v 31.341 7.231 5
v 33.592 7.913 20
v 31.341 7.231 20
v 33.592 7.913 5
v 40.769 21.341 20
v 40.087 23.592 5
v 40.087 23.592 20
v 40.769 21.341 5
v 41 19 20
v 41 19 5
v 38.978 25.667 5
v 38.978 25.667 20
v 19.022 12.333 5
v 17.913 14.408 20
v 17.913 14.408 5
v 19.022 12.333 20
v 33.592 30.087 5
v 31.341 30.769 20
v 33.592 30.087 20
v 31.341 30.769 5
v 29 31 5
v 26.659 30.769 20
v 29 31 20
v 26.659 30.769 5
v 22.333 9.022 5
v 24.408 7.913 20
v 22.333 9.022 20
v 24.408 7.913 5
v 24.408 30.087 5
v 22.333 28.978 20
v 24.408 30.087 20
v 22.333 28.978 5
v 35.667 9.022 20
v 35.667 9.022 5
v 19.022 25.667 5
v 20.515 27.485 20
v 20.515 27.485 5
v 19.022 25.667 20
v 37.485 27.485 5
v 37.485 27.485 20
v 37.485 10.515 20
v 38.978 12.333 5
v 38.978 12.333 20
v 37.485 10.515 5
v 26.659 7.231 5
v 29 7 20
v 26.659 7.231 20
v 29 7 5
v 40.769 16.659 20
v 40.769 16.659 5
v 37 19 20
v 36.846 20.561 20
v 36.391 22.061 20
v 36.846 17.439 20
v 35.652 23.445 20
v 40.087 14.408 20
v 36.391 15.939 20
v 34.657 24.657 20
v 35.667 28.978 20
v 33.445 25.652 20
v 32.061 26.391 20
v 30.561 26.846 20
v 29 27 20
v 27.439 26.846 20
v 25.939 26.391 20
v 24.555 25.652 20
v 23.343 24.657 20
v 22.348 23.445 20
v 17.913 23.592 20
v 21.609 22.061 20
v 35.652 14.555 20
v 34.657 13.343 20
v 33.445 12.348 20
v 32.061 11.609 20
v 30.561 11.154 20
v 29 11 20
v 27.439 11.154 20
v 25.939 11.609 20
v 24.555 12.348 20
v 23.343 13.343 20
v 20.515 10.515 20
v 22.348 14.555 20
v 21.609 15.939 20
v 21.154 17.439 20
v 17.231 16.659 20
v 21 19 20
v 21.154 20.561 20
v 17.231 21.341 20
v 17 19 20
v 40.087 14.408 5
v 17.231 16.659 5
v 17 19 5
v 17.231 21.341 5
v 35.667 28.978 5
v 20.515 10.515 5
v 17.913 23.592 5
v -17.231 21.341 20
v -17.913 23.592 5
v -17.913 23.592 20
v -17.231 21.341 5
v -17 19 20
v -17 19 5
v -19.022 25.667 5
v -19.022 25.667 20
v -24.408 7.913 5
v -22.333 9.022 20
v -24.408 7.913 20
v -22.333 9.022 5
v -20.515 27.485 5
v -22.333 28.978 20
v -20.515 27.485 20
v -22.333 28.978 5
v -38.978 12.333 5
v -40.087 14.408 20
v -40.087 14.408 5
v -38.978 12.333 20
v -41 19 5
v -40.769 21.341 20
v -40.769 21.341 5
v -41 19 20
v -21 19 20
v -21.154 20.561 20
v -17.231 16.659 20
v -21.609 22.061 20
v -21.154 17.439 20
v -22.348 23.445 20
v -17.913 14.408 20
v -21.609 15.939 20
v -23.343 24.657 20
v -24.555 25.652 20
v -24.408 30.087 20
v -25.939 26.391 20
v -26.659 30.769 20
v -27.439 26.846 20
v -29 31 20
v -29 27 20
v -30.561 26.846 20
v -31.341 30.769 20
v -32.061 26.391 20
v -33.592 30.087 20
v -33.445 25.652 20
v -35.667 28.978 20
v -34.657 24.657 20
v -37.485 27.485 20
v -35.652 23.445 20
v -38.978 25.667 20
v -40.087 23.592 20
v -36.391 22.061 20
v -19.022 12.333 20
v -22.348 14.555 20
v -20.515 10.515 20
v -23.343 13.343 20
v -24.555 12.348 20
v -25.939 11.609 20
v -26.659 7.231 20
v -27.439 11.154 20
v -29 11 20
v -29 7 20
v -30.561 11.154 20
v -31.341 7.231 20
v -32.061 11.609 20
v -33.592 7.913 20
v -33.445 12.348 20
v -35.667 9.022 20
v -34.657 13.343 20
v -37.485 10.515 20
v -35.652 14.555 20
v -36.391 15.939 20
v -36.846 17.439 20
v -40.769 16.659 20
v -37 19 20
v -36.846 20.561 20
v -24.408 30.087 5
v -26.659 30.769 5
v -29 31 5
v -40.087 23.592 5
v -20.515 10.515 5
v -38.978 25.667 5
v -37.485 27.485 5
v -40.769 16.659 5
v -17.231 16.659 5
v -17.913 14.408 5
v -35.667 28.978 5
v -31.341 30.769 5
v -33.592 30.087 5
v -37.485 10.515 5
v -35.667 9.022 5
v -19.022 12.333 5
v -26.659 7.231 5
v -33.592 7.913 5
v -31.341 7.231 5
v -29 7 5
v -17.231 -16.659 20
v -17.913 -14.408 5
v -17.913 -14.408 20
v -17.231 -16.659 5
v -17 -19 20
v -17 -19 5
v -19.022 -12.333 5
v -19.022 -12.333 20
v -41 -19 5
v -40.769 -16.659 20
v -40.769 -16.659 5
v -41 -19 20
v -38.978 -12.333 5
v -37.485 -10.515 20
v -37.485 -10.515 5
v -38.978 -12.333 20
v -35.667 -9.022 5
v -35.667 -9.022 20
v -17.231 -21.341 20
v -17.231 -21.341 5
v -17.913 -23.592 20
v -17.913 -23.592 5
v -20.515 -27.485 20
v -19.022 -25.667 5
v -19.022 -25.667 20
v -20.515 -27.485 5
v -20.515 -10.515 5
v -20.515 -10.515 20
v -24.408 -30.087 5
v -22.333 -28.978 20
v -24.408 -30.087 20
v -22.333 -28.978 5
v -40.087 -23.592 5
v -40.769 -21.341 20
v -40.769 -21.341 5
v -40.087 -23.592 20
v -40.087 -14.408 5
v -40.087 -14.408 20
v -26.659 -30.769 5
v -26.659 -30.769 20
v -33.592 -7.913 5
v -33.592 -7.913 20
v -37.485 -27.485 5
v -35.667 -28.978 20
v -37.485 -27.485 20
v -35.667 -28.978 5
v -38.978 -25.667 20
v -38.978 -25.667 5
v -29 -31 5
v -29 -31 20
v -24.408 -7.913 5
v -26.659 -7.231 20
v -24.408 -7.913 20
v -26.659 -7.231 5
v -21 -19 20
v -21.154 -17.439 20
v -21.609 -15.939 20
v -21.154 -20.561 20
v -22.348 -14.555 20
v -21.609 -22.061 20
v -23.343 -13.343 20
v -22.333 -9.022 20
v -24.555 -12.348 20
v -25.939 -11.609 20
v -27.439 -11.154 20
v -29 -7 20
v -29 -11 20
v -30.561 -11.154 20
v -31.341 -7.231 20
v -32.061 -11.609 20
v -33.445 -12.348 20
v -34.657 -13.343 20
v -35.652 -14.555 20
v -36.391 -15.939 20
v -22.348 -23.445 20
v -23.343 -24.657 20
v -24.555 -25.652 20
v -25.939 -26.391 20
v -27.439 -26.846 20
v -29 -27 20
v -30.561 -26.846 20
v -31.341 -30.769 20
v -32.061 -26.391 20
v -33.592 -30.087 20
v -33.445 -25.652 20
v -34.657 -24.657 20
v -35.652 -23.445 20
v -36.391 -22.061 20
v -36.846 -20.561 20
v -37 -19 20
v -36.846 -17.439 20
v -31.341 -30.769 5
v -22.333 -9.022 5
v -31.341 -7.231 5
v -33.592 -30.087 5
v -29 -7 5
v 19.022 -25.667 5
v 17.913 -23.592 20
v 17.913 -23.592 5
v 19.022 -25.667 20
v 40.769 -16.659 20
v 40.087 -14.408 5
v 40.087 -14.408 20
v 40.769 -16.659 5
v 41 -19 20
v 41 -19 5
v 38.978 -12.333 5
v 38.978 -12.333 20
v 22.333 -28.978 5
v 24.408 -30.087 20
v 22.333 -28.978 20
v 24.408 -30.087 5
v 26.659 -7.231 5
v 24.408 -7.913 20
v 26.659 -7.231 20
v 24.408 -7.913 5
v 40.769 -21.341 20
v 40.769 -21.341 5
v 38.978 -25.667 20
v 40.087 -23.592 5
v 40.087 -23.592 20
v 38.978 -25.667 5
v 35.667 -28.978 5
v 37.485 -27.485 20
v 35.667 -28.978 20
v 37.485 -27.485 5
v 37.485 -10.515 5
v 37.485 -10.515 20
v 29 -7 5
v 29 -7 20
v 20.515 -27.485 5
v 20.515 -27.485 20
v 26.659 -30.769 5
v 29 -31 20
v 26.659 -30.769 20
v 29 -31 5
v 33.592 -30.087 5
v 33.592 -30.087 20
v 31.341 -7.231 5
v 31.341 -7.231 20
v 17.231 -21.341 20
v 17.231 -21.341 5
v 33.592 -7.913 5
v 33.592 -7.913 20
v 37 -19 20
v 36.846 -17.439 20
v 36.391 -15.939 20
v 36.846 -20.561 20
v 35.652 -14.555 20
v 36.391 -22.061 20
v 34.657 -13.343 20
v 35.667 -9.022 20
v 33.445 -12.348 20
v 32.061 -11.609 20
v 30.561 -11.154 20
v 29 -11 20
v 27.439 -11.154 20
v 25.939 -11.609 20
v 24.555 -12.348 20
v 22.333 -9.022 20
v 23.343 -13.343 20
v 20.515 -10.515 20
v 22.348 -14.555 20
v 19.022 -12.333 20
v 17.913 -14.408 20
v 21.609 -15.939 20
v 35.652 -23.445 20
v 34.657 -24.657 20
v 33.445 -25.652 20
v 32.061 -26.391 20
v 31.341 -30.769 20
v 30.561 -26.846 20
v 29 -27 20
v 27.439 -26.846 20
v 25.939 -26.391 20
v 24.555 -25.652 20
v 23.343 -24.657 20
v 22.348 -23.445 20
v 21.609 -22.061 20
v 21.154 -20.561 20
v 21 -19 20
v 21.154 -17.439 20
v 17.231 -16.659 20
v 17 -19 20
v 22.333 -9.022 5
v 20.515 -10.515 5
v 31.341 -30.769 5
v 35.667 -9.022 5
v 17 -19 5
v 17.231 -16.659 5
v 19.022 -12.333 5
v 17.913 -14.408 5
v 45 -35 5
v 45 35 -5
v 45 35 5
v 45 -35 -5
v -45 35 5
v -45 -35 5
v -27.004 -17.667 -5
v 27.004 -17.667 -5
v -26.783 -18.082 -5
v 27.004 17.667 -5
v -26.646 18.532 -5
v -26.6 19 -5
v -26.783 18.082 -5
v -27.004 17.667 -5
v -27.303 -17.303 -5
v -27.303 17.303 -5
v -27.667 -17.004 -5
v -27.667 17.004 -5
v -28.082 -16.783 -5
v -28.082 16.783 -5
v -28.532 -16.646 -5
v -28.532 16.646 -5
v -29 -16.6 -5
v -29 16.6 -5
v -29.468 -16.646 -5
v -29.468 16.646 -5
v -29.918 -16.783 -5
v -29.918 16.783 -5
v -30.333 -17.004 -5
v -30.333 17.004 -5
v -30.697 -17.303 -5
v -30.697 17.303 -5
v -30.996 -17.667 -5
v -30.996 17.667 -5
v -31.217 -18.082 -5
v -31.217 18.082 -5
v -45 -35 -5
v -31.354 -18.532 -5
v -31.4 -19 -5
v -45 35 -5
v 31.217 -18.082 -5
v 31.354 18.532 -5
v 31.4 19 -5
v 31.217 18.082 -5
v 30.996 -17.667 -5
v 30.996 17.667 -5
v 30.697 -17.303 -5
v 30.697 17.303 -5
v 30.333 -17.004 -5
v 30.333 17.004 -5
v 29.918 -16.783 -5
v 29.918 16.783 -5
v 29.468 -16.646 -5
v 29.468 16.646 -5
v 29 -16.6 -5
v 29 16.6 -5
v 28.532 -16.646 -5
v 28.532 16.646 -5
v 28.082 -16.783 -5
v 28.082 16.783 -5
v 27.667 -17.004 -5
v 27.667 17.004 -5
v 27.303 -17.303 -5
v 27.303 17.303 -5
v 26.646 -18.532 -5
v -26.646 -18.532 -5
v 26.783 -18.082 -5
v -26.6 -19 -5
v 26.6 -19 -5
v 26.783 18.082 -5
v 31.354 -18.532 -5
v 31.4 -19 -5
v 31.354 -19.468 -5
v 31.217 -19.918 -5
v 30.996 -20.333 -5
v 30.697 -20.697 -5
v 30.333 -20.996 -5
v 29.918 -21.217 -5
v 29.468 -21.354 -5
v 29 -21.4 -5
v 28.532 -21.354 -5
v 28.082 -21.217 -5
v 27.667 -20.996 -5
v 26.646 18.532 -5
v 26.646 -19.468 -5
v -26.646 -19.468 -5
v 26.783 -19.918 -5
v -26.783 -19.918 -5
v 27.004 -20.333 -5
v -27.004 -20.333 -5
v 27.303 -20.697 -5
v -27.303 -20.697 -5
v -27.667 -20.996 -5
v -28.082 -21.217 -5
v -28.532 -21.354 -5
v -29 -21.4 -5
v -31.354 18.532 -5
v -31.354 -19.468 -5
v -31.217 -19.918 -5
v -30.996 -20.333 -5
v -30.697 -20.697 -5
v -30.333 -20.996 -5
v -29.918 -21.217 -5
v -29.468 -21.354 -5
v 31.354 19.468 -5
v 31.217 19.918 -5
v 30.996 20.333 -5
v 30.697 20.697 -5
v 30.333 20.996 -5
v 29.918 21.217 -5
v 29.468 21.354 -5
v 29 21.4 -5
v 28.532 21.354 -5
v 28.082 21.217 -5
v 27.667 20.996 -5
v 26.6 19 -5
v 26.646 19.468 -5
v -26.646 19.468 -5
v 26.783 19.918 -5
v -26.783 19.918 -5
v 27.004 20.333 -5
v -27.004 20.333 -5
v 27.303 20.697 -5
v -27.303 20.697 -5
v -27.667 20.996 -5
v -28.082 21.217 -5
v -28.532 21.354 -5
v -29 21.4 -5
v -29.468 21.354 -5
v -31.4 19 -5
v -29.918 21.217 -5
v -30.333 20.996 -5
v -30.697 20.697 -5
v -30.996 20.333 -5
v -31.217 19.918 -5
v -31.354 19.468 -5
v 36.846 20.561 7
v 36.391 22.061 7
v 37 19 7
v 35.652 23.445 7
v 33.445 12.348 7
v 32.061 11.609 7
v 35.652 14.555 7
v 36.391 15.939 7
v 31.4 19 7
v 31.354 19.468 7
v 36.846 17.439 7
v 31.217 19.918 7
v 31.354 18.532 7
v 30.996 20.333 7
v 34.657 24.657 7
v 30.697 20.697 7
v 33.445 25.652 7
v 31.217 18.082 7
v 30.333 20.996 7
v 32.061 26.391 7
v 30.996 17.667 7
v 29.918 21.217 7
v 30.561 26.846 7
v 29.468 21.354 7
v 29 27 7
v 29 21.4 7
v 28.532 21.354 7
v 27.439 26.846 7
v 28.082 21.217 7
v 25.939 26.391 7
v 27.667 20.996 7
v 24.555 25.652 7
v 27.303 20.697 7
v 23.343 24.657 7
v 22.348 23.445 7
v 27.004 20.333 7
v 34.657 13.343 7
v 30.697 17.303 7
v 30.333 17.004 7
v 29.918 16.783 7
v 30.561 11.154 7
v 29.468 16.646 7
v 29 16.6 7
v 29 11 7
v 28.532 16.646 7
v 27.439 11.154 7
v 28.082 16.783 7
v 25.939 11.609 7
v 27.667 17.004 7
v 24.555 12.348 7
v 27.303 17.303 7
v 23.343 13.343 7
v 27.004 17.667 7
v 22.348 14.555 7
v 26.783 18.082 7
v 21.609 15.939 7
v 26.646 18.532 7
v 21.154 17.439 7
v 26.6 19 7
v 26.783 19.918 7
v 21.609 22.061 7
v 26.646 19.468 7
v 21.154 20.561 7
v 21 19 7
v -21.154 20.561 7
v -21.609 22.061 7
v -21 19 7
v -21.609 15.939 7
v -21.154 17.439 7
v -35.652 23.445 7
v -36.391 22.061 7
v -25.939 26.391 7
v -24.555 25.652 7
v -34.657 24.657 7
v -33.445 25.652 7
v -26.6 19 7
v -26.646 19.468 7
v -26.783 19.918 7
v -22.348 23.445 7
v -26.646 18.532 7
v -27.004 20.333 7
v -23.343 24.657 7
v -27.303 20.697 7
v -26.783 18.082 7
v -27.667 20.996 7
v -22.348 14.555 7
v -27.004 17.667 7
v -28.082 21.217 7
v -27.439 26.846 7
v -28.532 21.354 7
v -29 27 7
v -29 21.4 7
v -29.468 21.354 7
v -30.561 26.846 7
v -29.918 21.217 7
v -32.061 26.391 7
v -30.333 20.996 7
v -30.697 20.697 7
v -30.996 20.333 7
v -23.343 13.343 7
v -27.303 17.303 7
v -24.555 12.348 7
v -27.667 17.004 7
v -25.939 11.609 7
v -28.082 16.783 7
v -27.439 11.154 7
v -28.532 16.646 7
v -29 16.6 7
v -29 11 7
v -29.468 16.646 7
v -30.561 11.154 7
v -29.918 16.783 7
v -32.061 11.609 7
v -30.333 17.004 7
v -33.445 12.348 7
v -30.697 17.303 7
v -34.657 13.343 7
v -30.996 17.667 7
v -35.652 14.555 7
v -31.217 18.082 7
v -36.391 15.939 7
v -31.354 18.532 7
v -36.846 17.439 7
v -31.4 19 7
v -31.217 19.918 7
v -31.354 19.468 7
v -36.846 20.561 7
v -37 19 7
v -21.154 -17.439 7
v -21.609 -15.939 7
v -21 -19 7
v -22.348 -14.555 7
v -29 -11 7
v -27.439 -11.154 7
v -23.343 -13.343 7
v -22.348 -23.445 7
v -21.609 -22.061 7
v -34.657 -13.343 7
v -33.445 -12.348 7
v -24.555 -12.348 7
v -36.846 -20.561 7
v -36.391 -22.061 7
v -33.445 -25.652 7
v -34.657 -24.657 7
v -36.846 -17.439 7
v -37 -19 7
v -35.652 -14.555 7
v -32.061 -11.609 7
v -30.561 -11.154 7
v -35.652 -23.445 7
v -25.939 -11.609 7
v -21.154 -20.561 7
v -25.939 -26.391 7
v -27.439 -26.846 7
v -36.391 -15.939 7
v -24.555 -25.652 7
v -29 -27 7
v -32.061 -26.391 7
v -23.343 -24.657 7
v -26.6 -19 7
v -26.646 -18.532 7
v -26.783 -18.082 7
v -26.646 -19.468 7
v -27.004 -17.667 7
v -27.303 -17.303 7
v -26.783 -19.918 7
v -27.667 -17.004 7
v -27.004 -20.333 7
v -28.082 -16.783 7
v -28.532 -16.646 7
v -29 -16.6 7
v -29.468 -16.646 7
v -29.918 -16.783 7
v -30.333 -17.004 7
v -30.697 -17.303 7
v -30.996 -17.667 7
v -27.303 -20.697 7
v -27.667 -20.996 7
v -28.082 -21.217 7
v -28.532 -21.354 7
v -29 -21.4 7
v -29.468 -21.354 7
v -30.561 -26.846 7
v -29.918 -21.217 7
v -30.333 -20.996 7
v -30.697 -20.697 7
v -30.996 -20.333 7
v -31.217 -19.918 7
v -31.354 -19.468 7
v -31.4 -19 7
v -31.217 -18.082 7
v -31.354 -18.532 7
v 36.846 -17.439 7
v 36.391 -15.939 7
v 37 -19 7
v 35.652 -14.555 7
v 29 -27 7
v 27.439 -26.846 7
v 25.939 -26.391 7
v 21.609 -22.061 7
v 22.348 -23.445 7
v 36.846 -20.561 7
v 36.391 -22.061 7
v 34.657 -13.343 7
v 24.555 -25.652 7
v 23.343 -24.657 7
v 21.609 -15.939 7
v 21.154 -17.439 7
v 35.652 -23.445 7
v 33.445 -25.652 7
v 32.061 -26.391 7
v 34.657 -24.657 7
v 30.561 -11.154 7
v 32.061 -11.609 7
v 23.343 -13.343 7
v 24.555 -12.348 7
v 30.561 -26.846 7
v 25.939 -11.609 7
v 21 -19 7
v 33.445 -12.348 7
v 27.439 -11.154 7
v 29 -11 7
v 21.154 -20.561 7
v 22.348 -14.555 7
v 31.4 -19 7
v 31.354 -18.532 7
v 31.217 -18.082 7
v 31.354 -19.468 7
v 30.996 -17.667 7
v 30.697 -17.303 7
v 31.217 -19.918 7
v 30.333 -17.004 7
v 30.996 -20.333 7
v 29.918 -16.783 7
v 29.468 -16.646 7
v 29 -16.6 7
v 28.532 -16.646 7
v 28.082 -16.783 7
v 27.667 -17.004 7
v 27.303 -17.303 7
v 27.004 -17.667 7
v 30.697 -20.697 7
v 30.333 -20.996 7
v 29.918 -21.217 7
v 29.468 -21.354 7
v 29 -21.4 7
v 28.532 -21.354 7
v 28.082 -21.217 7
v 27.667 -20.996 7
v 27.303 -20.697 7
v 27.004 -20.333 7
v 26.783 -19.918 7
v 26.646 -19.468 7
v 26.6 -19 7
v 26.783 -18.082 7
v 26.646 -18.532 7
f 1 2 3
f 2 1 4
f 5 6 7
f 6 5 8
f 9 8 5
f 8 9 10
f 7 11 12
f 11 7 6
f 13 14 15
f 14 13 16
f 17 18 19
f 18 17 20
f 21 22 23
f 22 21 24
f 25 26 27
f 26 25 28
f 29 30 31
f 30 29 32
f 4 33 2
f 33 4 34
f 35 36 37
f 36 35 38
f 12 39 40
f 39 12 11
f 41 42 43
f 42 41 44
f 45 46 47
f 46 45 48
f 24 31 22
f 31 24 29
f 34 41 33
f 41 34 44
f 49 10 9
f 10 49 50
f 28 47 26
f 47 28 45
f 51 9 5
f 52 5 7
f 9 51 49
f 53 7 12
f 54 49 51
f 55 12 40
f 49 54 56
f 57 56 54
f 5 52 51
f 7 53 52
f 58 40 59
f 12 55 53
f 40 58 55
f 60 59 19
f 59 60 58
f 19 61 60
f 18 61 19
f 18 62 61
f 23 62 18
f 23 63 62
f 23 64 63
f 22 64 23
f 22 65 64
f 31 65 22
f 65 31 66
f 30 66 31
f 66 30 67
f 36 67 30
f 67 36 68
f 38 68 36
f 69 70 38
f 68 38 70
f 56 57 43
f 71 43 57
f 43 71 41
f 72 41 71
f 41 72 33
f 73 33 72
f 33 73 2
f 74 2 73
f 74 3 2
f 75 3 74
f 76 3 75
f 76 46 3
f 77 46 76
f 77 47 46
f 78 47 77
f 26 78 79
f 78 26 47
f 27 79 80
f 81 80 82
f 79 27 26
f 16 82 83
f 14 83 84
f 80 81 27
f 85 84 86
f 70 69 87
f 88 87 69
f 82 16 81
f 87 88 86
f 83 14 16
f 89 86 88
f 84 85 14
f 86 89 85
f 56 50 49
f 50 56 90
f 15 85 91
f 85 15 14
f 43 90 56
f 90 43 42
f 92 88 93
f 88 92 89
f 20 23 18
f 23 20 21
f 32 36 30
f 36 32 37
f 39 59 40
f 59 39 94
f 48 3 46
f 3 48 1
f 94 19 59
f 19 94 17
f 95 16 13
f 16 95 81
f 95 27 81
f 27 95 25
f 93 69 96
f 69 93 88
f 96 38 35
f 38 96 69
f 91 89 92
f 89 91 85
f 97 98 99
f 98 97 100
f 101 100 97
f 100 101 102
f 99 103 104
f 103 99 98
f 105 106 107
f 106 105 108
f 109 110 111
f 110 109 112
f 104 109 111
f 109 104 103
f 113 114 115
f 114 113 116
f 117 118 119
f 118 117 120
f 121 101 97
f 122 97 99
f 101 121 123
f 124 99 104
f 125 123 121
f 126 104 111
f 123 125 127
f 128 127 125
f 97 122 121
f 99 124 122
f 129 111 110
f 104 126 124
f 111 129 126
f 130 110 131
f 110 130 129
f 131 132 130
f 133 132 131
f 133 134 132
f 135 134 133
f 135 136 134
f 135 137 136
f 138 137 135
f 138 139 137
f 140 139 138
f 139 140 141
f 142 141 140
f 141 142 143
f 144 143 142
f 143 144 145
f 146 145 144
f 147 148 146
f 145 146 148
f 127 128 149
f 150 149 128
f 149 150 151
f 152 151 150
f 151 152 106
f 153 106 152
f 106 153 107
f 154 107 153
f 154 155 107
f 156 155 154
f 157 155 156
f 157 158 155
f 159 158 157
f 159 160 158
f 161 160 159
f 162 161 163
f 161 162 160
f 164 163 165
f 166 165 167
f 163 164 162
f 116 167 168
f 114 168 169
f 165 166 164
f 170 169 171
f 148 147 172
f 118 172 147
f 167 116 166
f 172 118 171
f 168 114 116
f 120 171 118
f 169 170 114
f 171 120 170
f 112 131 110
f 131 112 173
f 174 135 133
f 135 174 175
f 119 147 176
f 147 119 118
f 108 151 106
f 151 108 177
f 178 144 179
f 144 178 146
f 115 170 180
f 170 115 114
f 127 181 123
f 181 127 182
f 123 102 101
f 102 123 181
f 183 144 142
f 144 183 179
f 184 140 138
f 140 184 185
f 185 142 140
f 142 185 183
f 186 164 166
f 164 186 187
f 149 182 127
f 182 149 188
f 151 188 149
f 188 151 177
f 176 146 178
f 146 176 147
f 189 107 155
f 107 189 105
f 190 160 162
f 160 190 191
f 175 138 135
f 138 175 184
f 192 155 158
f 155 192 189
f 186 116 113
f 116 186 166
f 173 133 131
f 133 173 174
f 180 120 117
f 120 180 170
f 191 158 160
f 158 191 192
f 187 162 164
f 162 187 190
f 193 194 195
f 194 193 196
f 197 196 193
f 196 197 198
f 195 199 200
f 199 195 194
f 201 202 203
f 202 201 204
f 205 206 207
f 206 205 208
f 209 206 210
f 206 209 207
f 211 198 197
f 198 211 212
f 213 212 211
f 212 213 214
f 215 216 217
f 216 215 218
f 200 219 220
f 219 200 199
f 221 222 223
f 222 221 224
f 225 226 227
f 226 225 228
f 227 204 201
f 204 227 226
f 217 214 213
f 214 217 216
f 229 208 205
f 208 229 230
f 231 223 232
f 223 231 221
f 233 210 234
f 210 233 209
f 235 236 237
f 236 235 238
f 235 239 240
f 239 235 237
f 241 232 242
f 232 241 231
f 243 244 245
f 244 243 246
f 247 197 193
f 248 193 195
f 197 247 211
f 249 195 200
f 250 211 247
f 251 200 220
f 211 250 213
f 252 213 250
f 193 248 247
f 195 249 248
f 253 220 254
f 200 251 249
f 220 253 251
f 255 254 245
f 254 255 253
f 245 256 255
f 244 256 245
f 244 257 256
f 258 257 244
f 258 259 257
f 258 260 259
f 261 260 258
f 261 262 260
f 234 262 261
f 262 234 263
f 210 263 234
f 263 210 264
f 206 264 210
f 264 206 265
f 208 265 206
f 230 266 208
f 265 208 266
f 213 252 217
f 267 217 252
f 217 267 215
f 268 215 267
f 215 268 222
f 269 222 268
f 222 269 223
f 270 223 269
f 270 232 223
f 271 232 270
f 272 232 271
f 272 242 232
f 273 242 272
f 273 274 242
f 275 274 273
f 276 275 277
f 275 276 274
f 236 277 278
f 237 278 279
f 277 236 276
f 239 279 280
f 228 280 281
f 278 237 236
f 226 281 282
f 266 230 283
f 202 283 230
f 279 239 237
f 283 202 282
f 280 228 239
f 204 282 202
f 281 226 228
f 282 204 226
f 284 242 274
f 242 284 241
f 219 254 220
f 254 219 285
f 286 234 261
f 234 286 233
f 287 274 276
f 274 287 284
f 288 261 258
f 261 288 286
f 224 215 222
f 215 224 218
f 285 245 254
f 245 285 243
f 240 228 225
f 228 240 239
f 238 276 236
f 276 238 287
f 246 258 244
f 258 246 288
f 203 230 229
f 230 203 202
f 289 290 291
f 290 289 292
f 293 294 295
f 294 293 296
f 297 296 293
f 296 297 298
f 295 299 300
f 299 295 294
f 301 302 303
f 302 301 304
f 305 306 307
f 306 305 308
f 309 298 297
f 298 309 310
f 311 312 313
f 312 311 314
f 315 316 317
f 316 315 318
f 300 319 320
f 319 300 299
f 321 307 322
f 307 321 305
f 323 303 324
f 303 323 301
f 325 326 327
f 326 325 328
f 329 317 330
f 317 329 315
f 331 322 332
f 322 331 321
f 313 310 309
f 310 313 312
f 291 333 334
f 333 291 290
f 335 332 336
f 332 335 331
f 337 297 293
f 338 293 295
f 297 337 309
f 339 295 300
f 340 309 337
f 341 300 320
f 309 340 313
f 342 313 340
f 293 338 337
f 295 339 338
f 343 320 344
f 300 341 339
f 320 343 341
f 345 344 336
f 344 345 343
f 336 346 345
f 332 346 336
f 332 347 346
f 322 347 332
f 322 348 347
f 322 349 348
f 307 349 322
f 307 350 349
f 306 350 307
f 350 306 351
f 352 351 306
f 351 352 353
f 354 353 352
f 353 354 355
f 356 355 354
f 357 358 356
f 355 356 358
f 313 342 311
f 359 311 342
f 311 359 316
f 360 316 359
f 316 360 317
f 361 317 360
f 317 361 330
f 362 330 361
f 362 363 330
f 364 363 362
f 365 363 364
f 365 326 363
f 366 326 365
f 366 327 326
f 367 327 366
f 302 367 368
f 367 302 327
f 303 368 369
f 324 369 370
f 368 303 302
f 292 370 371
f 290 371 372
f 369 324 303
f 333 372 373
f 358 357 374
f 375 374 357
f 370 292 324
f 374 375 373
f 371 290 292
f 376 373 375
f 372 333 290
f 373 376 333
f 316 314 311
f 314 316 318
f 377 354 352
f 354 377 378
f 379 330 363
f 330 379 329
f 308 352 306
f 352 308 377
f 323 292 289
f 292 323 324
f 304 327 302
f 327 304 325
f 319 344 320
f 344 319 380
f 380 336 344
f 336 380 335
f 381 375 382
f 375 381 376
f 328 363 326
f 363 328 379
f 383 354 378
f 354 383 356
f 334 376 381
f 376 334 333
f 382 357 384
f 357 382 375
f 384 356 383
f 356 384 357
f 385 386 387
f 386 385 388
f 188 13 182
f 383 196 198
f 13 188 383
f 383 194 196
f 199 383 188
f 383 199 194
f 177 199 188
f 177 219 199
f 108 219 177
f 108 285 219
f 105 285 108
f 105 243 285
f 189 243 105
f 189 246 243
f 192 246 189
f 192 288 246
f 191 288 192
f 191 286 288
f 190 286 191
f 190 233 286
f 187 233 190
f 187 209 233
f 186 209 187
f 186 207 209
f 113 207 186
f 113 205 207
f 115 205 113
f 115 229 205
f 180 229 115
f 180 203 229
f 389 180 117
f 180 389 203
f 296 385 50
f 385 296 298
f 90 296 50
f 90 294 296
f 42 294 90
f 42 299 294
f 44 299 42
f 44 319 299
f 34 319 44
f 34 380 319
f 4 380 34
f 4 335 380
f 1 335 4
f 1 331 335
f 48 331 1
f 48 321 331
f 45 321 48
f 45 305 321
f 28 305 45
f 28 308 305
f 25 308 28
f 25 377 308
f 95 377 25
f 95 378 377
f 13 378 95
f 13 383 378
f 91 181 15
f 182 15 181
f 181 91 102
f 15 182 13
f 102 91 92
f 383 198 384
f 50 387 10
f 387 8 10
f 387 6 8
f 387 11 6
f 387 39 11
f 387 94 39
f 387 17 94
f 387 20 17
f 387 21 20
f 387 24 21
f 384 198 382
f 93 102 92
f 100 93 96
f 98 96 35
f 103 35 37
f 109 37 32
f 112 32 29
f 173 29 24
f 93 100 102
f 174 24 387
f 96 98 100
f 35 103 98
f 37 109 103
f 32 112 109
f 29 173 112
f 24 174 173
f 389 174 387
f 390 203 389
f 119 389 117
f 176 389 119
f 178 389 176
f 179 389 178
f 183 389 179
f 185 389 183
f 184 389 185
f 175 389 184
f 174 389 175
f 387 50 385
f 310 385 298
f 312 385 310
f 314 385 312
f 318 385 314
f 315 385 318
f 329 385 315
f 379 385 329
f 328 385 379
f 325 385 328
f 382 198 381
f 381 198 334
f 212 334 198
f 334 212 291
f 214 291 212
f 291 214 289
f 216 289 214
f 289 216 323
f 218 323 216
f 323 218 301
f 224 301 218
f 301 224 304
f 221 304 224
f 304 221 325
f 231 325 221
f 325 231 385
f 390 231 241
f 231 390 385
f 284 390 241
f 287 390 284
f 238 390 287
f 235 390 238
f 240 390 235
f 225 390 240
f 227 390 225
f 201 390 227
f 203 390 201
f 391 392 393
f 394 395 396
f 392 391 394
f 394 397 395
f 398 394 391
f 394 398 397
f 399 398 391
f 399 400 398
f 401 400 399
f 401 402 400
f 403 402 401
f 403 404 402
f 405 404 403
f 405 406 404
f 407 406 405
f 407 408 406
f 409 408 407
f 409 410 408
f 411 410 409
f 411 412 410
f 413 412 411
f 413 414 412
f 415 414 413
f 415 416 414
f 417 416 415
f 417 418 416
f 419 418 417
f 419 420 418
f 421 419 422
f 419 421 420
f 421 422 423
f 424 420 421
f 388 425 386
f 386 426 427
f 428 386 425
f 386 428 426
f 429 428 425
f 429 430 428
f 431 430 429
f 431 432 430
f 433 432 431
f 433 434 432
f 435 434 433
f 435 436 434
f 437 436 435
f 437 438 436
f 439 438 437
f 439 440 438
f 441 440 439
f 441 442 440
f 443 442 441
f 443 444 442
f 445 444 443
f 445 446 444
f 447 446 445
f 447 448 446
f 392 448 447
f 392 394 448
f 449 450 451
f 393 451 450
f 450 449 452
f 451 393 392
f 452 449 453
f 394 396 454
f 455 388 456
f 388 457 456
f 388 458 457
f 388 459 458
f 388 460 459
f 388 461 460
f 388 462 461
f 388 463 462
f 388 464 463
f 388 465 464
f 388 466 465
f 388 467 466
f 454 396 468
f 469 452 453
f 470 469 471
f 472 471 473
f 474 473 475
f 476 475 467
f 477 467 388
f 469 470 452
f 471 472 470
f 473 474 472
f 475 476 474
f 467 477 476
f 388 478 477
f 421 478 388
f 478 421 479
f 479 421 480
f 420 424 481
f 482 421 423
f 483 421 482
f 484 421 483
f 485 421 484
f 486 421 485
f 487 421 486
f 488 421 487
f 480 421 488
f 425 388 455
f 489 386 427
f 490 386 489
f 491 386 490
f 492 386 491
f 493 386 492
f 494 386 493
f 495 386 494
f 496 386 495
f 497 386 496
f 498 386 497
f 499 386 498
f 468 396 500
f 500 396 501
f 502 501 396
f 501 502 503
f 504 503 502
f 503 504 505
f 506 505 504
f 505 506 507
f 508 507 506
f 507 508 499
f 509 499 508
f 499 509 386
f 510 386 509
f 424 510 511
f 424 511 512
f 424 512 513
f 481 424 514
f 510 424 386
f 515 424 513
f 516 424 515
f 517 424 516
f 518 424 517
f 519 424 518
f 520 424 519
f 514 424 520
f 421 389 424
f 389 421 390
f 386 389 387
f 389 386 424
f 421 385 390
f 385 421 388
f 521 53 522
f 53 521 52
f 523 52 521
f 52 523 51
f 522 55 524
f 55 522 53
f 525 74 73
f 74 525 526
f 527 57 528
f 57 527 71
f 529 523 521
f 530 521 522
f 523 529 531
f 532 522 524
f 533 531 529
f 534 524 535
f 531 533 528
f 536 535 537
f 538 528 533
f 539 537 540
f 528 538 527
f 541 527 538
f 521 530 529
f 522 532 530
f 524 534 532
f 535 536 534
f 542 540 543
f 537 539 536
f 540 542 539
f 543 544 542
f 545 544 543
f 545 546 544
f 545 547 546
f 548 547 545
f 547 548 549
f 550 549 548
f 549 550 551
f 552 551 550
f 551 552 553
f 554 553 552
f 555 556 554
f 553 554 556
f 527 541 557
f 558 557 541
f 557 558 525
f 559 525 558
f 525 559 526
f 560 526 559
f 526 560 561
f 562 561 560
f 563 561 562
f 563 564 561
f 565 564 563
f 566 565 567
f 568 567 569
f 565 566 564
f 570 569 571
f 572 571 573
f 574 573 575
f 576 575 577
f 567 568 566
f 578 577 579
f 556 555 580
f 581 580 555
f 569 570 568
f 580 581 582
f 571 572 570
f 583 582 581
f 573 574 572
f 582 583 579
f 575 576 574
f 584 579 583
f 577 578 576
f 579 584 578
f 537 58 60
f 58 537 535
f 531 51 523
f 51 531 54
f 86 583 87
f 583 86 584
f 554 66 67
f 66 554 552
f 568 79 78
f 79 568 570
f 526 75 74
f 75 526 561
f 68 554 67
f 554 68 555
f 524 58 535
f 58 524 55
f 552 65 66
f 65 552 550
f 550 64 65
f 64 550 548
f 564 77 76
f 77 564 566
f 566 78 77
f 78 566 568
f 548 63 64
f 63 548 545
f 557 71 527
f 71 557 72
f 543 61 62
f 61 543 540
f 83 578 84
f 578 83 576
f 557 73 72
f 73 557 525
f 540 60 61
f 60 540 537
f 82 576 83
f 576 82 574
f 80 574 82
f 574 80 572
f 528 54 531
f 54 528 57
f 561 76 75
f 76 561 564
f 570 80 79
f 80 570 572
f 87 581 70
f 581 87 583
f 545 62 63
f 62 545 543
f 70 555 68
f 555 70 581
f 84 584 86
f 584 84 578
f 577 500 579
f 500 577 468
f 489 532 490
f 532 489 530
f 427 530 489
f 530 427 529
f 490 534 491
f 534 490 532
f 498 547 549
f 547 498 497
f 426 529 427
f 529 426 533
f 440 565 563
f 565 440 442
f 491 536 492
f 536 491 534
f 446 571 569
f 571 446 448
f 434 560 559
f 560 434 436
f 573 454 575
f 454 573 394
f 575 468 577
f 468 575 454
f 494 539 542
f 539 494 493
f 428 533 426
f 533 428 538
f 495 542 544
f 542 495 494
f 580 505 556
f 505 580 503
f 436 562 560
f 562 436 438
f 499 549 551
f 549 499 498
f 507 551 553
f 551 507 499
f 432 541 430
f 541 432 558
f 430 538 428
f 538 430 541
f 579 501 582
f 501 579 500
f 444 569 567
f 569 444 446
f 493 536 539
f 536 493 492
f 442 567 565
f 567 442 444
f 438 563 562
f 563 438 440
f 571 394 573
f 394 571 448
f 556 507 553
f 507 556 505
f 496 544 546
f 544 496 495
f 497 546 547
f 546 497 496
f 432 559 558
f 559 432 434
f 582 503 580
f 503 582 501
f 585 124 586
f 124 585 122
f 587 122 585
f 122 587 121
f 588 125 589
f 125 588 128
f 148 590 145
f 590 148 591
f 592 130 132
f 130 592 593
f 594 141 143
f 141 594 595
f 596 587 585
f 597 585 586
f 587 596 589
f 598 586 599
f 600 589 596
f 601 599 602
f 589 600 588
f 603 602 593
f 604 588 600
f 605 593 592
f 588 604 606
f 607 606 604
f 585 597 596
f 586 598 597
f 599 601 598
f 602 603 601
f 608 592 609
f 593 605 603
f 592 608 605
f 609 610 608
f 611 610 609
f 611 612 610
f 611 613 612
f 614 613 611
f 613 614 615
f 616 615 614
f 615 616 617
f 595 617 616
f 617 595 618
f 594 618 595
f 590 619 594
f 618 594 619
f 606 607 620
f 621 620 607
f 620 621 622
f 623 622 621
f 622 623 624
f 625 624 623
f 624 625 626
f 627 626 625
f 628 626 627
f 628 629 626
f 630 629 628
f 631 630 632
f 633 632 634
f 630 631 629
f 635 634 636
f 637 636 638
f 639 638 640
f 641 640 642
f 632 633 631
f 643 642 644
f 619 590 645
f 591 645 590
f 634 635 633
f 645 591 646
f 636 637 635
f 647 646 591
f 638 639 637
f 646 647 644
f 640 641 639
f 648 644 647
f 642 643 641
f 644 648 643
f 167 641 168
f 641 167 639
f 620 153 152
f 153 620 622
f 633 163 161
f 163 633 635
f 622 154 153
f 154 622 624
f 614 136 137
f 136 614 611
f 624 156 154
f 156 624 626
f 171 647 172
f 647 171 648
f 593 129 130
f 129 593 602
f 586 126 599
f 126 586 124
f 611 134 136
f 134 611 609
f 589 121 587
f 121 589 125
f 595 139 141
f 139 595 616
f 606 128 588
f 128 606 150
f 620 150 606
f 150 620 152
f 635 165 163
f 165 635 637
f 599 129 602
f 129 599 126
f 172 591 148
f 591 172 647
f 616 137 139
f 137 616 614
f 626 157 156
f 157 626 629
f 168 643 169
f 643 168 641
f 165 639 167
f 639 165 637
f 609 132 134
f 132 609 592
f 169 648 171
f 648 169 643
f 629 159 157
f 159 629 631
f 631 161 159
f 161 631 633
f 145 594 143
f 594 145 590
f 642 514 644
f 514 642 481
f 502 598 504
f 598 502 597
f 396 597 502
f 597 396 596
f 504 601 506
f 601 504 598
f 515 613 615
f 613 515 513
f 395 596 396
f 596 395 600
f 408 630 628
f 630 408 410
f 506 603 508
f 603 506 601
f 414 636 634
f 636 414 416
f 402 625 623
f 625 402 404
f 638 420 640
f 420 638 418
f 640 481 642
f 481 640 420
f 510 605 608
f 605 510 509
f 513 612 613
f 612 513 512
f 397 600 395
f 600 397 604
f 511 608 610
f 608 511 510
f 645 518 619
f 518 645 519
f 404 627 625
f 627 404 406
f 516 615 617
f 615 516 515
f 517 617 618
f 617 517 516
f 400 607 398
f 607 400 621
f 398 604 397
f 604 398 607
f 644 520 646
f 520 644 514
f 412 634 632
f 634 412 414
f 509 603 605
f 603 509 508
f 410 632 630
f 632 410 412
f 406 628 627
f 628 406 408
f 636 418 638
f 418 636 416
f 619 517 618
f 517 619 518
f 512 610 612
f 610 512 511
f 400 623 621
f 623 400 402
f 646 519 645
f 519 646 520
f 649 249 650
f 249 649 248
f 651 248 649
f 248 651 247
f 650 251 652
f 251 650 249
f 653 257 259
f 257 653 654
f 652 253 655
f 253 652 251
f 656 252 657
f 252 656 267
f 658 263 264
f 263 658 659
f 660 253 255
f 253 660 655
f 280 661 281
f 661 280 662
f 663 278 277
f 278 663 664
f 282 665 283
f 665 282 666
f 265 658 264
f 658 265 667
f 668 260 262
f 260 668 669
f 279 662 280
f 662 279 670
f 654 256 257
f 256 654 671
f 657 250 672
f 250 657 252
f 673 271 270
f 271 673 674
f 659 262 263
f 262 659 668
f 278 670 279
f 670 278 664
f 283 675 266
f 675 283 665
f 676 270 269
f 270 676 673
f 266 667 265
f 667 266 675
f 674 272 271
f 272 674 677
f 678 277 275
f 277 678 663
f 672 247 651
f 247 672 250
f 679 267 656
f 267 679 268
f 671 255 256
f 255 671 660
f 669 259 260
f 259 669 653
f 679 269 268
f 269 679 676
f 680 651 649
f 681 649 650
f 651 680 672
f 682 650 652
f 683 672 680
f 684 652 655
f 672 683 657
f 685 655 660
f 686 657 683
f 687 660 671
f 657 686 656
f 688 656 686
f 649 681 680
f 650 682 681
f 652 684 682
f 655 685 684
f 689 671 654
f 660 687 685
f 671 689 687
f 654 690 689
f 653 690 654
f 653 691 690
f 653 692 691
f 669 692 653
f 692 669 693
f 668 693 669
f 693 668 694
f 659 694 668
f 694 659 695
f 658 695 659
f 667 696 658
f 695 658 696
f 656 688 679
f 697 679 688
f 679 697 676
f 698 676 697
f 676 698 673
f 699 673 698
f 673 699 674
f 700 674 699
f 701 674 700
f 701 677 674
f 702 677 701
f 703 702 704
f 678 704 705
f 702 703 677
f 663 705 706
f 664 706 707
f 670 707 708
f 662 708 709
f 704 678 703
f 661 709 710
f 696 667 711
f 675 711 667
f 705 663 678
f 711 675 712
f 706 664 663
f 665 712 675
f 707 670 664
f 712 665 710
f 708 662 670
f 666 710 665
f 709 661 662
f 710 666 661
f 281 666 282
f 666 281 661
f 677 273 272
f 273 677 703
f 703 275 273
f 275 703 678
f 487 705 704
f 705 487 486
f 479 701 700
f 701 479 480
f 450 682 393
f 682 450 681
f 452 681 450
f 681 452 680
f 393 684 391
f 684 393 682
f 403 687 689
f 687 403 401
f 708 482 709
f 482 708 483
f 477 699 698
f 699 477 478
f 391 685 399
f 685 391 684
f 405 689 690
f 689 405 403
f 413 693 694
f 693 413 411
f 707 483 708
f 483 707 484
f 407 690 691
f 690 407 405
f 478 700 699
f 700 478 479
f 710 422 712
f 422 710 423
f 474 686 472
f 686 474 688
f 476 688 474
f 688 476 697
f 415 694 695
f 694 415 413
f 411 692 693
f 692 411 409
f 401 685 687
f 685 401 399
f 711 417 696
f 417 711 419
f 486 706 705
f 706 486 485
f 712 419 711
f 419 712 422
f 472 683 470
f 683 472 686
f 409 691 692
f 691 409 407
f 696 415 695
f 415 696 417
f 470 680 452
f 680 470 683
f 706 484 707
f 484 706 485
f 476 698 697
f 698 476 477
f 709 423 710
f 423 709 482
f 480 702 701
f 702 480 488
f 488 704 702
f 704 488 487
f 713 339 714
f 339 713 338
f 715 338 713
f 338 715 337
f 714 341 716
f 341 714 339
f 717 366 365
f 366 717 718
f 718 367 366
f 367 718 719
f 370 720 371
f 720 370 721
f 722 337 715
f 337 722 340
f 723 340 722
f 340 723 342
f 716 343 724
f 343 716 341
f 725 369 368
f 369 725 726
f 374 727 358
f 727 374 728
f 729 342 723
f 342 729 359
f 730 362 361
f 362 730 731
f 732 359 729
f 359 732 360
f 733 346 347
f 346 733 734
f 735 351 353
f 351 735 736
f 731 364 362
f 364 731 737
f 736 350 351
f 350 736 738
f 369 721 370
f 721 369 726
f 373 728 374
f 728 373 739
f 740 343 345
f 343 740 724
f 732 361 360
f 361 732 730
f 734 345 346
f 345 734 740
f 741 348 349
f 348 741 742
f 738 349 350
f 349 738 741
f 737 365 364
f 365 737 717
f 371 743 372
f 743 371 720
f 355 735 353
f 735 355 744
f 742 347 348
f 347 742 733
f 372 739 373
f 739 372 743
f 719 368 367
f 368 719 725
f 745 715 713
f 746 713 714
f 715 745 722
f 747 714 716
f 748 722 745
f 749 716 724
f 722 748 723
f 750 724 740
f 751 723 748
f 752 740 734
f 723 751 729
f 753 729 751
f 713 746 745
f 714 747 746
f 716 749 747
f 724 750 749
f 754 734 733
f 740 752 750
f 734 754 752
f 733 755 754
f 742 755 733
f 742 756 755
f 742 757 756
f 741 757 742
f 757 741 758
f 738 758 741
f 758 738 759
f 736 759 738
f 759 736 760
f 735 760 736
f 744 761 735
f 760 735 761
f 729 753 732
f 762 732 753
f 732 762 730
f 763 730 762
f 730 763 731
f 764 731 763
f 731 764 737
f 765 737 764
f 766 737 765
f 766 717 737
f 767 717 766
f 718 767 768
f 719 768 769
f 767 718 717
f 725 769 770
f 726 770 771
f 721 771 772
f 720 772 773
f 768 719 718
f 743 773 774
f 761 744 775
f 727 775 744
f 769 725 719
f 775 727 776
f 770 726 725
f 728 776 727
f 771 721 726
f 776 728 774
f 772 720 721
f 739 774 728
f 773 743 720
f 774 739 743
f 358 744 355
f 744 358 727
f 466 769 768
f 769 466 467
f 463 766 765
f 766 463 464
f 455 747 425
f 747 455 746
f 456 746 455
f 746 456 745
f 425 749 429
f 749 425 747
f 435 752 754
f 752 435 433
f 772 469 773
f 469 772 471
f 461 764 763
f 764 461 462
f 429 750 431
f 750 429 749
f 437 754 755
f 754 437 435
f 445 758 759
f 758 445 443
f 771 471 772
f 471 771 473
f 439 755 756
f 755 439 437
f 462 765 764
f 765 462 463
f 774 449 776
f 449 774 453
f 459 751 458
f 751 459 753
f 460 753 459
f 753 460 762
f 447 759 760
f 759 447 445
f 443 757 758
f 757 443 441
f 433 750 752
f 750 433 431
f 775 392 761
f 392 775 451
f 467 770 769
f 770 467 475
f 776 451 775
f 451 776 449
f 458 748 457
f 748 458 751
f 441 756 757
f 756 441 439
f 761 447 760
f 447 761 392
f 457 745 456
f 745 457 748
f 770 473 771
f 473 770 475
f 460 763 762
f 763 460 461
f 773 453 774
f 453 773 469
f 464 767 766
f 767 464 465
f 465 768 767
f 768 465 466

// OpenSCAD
$fn = 32;

// ----------------------------------------------------------------------
// Socket pad plate
// bosses with counterbored sockets for the screws
// ----------------------------------------------------------------------

// --- parameters (mm) ---
base_t = 10;           // base plate thickness
boss_h = 15;           // boss height above the base plate
boss_d = 24;           // boss diameter
socket_d = 16;         // socket diameter
socket_depth = 13;     // socket depth from the boss face
bolt_d = 4.8;          // screw clearance hole through the socket floor
plate = [90, 70, 10];  // overall size (x, y, z)
edge = 16;             // boss centre offset from the plate edge
pads = 4;              // boss count, one per corner

// --- derived feature positions (mm) ---
height = base_t + boss_h;        // = 25   overall height of the part
corner_x = plate[0] / 2 - edge;  // = 29   boss centre X
corner_y = plate[1] / 2 - edge;  // = 19   boss centre Y
feature_centers = [
  [corner_x, corner_y],
  [-corner_x, corner_y],
  [-corner_x, -corner_y],
  [corner_x, -corner_y]
];   // boss centres: sockets, holes and the pads themselves are placed from here

// base plate, bosses on feature_centers, socket + through hole in each
difference() {
  union() {
    cube(plate, center = true);
    for (centre = feature_centers)
      translate([centre[0], centre[1], plate[2] / 2 - 1])
        cylinder(d = boss_d, h = boss_h + 1);
  }
  for (centre = feature_centers) {
    translate([centre[0], centre[1], plate[2] / 2 + boss_h - socket_depth])
      cylinder(d = socket_d, h = socket_depth + 1);
    translate([centre[0], centre[1], -height])
      cylinder(d = bolt_d, h = 2 * height + 2);  // through the socket floor
  }
}
